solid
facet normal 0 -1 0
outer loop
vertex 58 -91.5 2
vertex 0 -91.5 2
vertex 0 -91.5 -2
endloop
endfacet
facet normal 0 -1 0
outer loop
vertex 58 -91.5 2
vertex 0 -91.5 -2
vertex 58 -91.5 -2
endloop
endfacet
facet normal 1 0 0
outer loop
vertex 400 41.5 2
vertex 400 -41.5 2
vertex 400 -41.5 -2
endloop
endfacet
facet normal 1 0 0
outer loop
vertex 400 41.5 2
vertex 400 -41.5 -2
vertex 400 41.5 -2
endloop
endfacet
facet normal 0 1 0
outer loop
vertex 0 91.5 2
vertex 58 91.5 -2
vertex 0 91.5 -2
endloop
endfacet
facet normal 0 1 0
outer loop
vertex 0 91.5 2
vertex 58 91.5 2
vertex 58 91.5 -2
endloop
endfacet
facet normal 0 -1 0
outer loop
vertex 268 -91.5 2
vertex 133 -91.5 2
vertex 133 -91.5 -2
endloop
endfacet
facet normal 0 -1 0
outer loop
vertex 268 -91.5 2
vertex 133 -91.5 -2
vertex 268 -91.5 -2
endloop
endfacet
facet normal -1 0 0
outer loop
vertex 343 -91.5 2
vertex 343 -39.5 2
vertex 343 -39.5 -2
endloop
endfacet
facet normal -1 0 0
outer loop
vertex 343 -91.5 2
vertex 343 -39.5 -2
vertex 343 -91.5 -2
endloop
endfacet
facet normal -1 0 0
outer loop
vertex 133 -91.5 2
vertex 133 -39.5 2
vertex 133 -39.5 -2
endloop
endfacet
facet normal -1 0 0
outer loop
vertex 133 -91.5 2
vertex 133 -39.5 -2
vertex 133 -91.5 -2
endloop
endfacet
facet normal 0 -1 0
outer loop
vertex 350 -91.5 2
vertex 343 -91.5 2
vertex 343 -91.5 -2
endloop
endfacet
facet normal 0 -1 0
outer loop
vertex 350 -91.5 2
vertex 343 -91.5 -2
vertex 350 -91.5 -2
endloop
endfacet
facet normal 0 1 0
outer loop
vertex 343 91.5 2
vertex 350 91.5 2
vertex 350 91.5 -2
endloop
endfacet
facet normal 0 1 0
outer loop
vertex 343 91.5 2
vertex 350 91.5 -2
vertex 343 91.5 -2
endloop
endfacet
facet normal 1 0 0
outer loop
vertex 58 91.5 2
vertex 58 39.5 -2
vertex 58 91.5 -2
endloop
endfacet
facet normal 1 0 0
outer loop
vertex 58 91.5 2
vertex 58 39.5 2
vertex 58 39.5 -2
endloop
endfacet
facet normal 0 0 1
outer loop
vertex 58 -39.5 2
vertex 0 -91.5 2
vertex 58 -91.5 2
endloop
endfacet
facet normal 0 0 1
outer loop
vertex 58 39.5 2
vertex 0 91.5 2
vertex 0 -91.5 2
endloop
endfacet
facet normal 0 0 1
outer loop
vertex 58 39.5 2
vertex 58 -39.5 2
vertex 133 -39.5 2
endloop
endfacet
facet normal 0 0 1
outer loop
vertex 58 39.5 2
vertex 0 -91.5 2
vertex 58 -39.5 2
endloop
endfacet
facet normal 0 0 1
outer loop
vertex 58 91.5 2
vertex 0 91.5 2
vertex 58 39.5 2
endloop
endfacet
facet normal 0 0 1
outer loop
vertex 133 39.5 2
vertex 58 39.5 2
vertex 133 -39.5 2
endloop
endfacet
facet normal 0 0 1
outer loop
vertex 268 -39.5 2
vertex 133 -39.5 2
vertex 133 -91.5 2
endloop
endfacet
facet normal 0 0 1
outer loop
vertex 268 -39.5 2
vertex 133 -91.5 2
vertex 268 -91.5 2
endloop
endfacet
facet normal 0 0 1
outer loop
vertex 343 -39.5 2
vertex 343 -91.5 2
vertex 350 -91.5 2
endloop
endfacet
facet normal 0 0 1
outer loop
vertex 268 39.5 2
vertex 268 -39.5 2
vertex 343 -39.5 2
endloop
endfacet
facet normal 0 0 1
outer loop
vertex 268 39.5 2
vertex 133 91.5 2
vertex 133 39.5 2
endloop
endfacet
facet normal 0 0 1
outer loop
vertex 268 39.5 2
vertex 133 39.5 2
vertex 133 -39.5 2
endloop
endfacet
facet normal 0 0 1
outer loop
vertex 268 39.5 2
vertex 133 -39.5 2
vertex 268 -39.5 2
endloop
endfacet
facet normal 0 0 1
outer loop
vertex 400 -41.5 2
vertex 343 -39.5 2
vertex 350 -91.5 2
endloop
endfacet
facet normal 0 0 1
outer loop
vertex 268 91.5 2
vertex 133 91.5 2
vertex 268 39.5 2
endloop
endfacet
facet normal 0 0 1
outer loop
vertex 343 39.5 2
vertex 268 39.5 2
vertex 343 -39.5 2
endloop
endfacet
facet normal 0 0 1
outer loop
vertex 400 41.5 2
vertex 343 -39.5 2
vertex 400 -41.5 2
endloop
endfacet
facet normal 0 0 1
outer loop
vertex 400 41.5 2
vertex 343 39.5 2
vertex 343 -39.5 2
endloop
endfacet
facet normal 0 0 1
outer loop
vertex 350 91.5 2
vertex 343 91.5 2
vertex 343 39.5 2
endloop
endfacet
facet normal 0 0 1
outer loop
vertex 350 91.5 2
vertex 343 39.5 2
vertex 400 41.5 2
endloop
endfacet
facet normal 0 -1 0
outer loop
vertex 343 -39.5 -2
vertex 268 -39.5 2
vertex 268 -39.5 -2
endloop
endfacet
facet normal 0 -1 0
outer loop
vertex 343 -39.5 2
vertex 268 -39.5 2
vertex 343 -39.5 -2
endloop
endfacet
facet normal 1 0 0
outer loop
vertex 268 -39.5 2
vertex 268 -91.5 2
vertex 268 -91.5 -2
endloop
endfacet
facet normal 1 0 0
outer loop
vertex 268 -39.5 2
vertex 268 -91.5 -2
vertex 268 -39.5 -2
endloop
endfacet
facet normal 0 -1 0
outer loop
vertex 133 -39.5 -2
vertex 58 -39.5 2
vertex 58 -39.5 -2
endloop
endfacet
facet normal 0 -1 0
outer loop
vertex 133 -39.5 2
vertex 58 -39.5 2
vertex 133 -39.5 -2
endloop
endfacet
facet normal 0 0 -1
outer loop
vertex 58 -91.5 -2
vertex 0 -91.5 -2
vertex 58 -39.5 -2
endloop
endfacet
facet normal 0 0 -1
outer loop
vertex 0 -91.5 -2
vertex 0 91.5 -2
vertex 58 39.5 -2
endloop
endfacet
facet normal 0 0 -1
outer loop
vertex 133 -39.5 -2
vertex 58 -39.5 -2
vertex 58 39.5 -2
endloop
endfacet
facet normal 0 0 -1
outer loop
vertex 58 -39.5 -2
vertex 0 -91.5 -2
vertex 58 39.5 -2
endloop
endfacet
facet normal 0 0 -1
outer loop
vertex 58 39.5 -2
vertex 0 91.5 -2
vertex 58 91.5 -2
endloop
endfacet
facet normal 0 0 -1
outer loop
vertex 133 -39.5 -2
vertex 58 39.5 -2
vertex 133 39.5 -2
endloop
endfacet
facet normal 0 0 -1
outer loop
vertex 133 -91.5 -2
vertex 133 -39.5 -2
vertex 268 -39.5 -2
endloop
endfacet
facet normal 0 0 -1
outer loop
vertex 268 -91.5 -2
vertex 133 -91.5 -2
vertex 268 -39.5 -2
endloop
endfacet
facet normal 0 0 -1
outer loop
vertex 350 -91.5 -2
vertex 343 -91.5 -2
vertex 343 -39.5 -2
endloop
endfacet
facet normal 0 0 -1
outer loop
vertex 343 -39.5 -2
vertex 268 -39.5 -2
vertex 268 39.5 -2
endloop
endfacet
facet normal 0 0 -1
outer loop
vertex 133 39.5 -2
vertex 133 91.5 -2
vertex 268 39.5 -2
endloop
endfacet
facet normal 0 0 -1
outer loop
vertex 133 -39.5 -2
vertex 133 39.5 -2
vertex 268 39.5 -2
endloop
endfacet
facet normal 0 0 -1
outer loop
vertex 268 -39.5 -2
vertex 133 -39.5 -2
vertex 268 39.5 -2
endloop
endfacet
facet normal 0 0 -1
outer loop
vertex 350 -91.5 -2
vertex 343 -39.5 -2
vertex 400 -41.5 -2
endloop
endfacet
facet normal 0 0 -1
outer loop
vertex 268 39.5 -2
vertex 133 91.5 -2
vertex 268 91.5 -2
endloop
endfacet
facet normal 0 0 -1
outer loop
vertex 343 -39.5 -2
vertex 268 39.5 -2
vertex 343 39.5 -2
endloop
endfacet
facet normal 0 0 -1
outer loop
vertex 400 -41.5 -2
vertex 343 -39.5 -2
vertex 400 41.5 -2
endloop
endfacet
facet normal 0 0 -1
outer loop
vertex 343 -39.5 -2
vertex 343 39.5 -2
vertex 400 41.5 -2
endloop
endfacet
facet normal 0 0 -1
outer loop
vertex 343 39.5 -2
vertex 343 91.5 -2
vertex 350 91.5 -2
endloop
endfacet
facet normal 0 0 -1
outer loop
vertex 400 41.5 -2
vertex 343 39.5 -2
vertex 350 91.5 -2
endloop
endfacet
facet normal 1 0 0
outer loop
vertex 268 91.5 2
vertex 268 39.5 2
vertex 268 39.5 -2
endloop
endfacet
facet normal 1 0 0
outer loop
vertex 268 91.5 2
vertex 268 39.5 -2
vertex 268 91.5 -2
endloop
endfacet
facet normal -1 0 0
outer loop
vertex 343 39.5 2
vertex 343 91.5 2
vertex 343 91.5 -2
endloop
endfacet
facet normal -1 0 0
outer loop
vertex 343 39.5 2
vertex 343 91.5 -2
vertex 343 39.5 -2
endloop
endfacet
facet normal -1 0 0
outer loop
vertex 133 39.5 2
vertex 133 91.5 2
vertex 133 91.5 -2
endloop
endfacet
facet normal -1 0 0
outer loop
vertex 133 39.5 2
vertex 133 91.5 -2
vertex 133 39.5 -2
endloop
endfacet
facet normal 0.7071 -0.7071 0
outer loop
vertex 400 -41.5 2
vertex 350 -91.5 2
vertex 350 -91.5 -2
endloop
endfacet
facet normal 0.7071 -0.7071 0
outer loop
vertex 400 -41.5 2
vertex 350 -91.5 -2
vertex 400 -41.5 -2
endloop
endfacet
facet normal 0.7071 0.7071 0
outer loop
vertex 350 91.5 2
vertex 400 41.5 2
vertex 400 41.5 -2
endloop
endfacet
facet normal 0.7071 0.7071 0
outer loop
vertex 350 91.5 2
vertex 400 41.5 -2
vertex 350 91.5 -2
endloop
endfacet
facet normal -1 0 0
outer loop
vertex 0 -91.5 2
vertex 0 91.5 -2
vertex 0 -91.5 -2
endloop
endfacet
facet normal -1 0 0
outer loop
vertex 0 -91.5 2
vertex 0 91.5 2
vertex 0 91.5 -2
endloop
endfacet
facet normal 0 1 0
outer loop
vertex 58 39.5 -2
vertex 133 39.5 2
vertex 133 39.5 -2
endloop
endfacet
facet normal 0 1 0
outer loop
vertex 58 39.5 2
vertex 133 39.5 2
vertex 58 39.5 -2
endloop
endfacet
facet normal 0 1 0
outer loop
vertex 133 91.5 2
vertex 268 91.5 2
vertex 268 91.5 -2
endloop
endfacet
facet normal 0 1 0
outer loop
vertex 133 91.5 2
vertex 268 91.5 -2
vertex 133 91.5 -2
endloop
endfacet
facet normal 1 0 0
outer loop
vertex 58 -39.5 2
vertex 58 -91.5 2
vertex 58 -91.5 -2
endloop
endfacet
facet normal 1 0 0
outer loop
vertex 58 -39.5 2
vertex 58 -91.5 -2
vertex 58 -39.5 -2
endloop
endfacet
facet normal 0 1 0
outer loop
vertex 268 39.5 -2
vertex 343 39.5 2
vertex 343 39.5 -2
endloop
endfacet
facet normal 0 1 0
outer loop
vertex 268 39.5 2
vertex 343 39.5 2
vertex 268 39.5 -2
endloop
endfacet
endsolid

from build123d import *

# Parameters (mm, degrees)
F1_DEPTH = 2


with BuildPart() as f1:
    # F0 (on Top) → F1 (new body, symmetric)
    with BuildSketch(Plane.XY):
        Polygon((0, 91.5), (0, 0), (0, -91.5), (58, -91.5), (58, -39.5), (133, -39.5), (133, -91.5), (268, -91.5), (268, -39.5), (343, -39.5), (343, -91.5), (350, -91.5), (400, -41.5), (400, 0), (400, 41.5), (350, 91.5), (343, 91.5), (343, 39.5), (268, 39.5), (268, 91.5), (133, 91.5), (133, 39.5), (58, 39.5), (58, 91.5), align=None)
    extrude(amount=F1_DEPTH, both=True)


solid = f1.part
